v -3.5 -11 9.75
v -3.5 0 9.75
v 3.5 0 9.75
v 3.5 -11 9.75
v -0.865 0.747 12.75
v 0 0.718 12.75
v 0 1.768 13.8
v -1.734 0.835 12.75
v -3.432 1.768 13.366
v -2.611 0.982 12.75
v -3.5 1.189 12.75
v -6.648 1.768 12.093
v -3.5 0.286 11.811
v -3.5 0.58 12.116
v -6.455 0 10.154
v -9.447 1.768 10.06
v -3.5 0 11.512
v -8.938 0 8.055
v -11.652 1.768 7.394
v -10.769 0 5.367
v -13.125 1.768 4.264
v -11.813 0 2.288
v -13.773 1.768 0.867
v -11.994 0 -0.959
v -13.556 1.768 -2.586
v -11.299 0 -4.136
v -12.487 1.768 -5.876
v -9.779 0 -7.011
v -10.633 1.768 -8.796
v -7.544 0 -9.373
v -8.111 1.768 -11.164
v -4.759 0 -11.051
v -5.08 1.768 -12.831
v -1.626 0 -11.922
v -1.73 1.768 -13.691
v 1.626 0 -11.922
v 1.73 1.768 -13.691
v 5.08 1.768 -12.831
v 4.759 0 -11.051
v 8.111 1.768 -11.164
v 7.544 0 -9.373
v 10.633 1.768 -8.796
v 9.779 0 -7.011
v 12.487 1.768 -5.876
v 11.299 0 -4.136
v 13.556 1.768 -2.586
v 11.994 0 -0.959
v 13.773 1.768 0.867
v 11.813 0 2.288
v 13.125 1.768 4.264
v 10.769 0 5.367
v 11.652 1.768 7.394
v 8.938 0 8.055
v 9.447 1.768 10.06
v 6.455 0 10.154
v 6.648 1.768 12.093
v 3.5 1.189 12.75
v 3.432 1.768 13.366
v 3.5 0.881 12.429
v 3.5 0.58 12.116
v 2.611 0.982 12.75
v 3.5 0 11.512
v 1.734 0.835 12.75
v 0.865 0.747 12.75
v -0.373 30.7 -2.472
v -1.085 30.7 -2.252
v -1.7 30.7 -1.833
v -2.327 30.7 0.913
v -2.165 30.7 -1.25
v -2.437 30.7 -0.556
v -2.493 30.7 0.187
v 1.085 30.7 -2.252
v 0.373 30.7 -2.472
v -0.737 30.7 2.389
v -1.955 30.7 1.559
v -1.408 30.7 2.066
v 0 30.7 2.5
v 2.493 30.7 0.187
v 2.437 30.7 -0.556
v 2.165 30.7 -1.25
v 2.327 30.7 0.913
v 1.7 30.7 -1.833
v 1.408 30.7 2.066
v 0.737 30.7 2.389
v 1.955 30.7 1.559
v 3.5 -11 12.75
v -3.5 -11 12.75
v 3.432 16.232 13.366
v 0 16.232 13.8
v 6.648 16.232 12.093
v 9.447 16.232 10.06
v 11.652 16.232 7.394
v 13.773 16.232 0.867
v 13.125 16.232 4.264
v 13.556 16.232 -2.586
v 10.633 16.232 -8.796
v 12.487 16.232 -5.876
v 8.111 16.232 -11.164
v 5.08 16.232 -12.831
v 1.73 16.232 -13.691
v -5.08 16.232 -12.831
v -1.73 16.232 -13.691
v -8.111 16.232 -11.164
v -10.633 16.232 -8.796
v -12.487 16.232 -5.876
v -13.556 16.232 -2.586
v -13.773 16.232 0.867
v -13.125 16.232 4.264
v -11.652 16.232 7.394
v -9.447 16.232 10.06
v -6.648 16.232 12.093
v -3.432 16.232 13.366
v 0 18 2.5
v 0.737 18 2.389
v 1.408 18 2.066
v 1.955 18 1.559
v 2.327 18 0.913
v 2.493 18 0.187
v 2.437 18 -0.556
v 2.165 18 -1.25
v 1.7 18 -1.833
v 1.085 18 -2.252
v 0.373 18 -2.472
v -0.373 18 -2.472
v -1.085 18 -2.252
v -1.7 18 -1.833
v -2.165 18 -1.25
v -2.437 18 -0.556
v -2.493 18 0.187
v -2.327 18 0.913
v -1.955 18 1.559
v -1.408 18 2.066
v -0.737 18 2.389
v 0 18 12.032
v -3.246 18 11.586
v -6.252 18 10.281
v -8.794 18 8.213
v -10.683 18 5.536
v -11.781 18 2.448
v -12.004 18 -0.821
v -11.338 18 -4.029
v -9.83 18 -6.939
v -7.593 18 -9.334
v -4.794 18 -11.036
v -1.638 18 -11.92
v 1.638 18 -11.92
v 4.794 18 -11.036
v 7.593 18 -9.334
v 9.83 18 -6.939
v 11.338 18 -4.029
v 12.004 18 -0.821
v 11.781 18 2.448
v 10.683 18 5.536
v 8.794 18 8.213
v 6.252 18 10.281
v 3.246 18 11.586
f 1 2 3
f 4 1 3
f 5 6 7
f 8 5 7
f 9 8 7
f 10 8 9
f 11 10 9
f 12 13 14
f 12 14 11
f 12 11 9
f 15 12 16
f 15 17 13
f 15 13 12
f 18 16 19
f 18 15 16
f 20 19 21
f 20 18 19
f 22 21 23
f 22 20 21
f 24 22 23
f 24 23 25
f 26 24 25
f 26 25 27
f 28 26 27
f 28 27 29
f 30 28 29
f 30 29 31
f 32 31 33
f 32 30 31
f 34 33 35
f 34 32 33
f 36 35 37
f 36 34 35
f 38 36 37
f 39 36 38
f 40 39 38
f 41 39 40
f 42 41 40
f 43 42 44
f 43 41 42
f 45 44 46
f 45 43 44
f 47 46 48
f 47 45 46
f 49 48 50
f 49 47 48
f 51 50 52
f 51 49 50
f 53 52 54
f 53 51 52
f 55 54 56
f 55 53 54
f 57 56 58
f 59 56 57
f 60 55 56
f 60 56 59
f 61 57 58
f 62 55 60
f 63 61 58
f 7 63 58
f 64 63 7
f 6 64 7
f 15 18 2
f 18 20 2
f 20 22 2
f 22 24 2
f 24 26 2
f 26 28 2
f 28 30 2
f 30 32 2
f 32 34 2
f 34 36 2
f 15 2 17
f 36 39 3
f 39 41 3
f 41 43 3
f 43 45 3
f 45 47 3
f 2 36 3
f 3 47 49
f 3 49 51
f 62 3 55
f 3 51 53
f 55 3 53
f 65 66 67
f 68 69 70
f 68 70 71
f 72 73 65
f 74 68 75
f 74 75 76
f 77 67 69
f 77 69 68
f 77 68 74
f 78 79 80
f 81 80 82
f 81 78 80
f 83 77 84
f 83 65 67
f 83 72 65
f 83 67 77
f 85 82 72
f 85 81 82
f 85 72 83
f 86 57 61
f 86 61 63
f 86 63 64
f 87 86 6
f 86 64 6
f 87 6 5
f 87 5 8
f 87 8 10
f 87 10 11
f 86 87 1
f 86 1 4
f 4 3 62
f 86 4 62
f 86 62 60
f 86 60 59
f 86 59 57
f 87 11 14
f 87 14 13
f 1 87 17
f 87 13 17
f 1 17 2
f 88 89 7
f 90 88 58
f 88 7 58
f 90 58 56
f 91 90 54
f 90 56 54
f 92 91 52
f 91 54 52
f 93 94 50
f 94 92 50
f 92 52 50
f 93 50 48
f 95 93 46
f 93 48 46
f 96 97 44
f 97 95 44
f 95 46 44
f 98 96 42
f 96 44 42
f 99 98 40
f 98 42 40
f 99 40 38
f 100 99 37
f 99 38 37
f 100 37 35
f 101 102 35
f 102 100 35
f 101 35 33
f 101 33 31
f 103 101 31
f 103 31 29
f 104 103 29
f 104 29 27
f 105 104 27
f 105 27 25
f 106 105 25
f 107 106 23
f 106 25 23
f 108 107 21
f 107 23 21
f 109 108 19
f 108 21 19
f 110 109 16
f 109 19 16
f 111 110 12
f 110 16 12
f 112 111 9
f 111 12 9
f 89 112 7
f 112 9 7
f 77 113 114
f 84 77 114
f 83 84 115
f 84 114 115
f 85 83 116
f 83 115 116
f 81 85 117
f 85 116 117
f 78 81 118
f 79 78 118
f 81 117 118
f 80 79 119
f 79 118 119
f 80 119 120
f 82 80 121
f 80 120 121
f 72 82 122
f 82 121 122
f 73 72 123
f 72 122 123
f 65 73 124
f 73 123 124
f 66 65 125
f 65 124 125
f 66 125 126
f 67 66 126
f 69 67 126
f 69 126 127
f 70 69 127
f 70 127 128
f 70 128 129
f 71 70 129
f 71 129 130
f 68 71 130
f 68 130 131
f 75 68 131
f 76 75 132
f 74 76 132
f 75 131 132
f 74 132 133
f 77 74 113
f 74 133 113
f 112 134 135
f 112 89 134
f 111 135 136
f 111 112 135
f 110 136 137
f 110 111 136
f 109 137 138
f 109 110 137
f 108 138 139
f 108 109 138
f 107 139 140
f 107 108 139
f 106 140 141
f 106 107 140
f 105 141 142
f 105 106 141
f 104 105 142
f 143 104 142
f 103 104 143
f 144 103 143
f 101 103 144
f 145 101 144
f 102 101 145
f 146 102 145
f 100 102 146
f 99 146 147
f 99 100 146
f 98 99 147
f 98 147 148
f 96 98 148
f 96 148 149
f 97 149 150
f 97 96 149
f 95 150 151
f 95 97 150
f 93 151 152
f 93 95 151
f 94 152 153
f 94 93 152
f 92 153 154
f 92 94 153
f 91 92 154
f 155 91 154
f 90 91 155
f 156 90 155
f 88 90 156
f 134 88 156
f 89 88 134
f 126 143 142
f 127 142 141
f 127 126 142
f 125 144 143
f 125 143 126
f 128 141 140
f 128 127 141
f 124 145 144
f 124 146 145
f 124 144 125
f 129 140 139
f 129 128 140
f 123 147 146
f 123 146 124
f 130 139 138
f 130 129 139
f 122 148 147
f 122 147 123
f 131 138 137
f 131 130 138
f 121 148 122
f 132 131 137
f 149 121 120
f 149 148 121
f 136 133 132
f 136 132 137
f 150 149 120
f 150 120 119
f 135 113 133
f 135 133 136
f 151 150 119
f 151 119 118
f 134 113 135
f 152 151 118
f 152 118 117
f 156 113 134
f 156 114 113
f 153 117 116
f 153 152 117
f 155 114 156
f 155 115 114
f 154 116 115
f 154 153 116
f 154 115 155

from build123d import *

# Parameters (mm, degrees)
SKETCH1_R                = 13.8
BOSS_EXTRUDE1_DEPTH      = 18
SKETCH3_R                = 2.5
BOSS_EXTRUDE2_DEPTH      = 12.7
BOSS_EXTRUDE3_DEPTH      = 11
BOSS_EXTRUDE3_DEPTH_BACK = 3


with BuildPart() as part:
    # Sketch1 → Boss-Extrude1 (new body)
    with BuildSketch(Plane(origin=(0, 0, 0), x_dir=(1, 0, 0), z_dir=(0, 1, 0))):
        with Locations(Location((0, 0, 0), (0, 0, 270))):
            Circle(SKETCH1_R)
    extrude(amount=BOSS_EXTRUDE1_DEPTH)

    # Sketch2 → Cut-Revolve1 (revolve, cut)
    with BuildSketch(Plane(origin=(0, 0, 0), x_dir=(0, 0, -1), z_dir=(1, 0, 0)), mode=Mode.PRIVATE) as cut_revolve1_sk:
        Polygon((12.032233047, 18), (13.8, 16.232233047), (13.8, 18), align=None)
        Polygon((13.8, 0), (13.8, 1.767766953), (12.032233047, 0), align=None)
    revolve(cut_revolve1_sk.sketch.rotate(Axis((0, 18, 0), (0, -1, 0)), 180), axis=Axis((0, 18, 0), (0, -1, 0)), mode=Mode.SUBTRACT)

    # Sketch3 → Boss-Extrude2 (add)
    with BuildSketch(Plane(origin=(0, 18, 0), x_dir=(1, 0, 0), z_dir=(0, 1, 0))):
        with Locations(Location((0, 0, 0), (0, 0, 270))):
            Circle(SKETCH3_R)
    extrude(amount=BOSS_EXTRUDE2_DEPTH)

    # Sketch4 → Boss-Extrude3 (add, two sides: drawn at the far end of the back side and taken through both)
    with BuildSketch(Plane.XZ.offset(-BOSS_EXTRUDE3_DEPTH_BACK)):
        with BuildLine():
            Line((3.5, 12.75), (-3.5, 12.75))
            Line((-3.5, 12.75), (-3.5, 11.511934333))
            ThreePointArc((-3.5, 11.511934333), (0, 12.032233047), (3.5, 11.511934333))
            Line((3.5, 11.511934333), (3.5, 12.75))
        make_face()
        with BuildLine():
            ThreePointArc((3.5, 11.511934333), (0, 12.032233047), (-3.5, 11.511934333))
            Line((-3.5, 11.511934333), (-3.5, 9.75))
            Line((-3.5, 9.75), (0, 9.75))
            Line((0, 9.75), (3.5, 9.75))
            Line((3.5, 9.75), (3.5, 11.511934333))
        make_face()
    extrude(amount=BOSS_EXTRUDE3_DEPTH + BOSS_EXTRUDE3_DEPTH_BACK)


solid = part.part
